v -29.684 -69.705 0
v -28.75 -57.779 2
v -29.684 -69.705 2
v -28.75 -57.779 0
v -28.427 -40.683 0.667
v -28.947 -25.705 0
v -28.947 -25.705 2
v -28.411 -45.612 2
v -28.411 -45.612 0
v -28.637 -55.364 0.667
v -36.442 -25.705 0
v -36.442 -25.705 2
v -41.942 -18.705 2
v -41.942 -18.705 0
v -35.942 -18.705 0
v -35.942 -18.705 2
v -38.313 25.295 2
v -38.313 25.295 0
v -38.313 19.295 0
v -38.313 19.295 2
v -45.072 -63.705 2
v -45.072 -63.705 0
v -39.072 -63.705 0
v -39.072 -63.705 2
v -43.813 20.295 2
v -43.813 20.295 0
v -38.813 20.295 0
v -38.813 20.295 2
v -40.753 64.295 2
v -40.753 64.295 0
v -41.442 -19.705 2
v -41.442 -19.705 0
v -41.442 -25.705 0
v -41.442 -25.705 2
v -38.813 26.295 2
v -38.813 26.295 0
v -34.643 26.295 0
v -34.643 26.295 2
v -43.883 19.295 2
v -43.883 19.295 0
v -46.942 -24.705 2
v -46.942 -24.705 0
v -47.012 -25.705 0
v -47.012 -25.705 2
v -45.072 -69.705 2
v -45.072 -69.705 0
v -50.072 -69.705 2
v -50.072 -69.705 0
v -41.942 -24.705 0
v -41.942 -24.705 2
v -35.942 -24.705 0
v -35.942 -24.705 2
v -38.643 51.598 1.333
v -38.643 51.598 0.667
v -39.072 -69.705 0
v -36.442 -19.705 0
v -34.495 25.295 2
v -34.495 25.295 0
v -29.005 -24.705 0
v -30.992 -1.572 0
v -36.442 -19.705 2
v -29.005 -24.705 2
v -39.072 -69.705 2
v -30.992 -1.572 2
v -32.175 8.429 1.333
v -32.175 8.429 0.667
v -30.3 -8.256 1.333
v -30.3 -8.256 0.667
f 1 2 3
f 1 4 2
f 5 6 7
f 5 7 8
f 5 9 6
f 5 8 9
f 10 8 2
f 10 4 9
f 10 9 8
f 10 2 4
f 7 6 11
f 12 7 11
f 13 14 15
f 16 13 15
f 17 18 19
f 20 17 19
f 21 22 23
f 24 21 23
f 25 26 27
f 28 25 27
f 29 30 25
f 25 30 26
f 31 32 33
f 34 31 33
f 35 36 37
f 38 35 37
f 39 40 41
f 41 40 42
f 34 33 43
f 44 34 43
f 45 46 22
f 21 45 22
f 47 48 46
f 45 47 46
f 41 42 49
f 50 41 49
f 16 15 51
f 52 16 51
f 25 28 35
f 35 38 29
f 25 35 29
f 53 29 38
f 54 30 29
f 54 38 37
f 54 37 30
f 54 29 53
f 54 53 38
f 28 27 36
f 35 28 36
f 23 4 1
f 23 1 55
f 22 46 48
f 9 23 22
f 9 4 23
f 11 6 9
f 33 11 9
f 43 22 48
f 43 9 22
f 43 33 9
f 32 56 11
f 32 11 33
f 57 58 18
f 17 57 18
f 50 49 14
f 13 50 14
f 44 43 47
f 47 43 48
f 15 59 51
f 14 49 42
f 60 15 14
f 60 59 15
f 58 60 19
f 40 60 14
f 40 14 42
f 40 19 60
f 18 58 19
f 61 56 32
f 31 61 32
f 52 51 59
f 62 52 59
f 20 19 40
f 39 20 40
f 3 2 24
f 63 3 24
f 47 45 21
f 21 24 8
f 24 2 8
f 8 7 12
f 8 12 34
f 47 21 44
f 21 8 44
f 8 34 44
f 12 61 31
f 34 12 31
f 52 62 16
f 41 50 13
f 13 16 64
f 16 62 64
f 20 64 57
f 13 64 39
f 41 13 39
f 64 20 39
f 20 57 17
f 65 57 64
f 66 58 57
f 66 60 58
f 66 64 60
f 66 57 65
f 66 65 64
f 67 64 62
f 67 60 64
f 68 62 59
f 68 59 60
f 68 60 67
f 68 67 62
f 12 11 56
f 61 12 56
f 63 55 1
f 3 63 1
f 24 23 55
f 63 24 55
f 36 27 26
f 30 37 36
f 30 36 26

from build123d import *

# Parameters (mm, degrees)
F1_DEPTH = 2


with BuildPart() as f1:
    # F0 (on Top) → F1 (new body)
    with BuildSketch(Plane.XY):
        with BuildLine():
            add(Edge.make_bspline(
                [(-34.4950757243, 25.2946874197), (-31.9979345744, 8.3570934049), (-29.9651182209, -8.3919319955), (-29.0050185061, -24.7053125803)],
                knots=[0.1484687426, 0.1484687426, 0.1484687426, 0.1484687426, 0.343003199, 0.343003199, 0.343003199, 0.343003199], degree=3))
            Line((-34.4950757243, 25.2946874197), (-38.3131276168, 25.2946874197))
            Line((-38.3131276168, 25.2946874197), (-38.3131276168, 19.2946874197))
            Line((-38.3131276168, 19.2946874197), (-43.8826658205, 19.2946874197))
            Line((-43.8826658205, 19.2946874197), (-46.9423467859, -24.7053125803))
            Line((-46.9423467859, -24.7053125803), (-41.9423467859, -24.7053125803))
            Line((-41.9423467859, -24.7053125803), (-41.9423467859, -18.7053125803))
            Line((-41.9423467859, -18.7053125803), (-35.9423467859, -18.7053125803))
            Line((-35.9423467859, -18.7053125803), (-35.9423467859, -24.7053125803))
            Line((-35.9423467859, -24.7053125803), (-29.0050185061, -24.7053125803))
        make_face()
    extrude(amount=F1_DEPTH)


with BuildPart() as f1b:
    # F0 (on Top) → F1, piece 2 (new body)
    with BuildSketch(Plane.XY):
        with BuildLine():
            add(Edge.make_bspline(
                [(-40.7534466514, 64.2946874197), (-38.6332764023, 51.5941678927), (-36.5131061532, 38.8936483656), (-34.6430102214, 26.2946874197)],
                knots=[0, 0, 0, 0, 0.1446411187, 0.1446411187, 0.1446411187, 0.1446411187], degree=3))
            Line((-40.7534466514, 64.2946874197), (-43.8131276168, 20.2946874197))
            Line((-43.8131276168, 20.2946874197), (-38.8131276168, 20.2946874197))
            Line((-38.8131276168, 20.2946874197), (-38.8131276168, 26.2946874197))
            Line((-38.8131276168, 26.2946874197), (-34.6430102214, 26.2946874197))
        make_face()
    extrude(amount=F1_DEPTH)


with BuildPart() as f1c:
    # F0 (on Top) → F1, piece 3 (new body)
    with BuildSketch(Plane.XY):
        with BuildLine():
            add(Edge.make_bspline(
                [(-28.9474830129, -25.7053125803), (-28.0980614593, -40.8166316864), (-28.1818146304, -55.548975846), (-29.6839084476, -69.7053125803)],
                knots=[0.3469803254, 0.3469803254, 0.3469803254, 0.3469803254, 0.5273785134, 0.5273785134, 0.5273785134, 0.5273785134], degree=3))
            Line((-28.9474830129, -25.7053125803), (-36.4423467859, -25.7053125803))
            Line((-36.4423467859, -25.7053125803), (-36.4423467859, -19.7053125803))
            Line((-36.4423467859, -19.7053125803), (-41.4423467859, -19.7053125803))
            Line((-41.4423467859, -19.7053125803), (-41.4423467859, -25.7053125803))
            Line((-41.4423467859, -25.7053125803), (-47.0118849897, -25.7053125803))
            Line((-47.0118849897, -25.7053125803), (-50.0715659551, -69.7053125803))
            Line((-50.0715659551, -69.7053125803), (-45.0715659551, -69.7053125803))
            Line((-45.0715659551, -69.7053125803), (-45.0715659551, -63.7053125803))
            Line((-45.0715659551, -63.7053125803), (-39.0715659551, -63.7053125803))
            Line((-39.0715659551, -63.7053125803), (-39.0715659551, -69.7053125803))
            Line((-39.0715659551, -69.7053125803), (-29.6839084476, -69.7053125803))
        make_face()
    extrude(amount=F1_DEPTH)


solid = Compound([f1.part, f1b.part, f1c.part])
